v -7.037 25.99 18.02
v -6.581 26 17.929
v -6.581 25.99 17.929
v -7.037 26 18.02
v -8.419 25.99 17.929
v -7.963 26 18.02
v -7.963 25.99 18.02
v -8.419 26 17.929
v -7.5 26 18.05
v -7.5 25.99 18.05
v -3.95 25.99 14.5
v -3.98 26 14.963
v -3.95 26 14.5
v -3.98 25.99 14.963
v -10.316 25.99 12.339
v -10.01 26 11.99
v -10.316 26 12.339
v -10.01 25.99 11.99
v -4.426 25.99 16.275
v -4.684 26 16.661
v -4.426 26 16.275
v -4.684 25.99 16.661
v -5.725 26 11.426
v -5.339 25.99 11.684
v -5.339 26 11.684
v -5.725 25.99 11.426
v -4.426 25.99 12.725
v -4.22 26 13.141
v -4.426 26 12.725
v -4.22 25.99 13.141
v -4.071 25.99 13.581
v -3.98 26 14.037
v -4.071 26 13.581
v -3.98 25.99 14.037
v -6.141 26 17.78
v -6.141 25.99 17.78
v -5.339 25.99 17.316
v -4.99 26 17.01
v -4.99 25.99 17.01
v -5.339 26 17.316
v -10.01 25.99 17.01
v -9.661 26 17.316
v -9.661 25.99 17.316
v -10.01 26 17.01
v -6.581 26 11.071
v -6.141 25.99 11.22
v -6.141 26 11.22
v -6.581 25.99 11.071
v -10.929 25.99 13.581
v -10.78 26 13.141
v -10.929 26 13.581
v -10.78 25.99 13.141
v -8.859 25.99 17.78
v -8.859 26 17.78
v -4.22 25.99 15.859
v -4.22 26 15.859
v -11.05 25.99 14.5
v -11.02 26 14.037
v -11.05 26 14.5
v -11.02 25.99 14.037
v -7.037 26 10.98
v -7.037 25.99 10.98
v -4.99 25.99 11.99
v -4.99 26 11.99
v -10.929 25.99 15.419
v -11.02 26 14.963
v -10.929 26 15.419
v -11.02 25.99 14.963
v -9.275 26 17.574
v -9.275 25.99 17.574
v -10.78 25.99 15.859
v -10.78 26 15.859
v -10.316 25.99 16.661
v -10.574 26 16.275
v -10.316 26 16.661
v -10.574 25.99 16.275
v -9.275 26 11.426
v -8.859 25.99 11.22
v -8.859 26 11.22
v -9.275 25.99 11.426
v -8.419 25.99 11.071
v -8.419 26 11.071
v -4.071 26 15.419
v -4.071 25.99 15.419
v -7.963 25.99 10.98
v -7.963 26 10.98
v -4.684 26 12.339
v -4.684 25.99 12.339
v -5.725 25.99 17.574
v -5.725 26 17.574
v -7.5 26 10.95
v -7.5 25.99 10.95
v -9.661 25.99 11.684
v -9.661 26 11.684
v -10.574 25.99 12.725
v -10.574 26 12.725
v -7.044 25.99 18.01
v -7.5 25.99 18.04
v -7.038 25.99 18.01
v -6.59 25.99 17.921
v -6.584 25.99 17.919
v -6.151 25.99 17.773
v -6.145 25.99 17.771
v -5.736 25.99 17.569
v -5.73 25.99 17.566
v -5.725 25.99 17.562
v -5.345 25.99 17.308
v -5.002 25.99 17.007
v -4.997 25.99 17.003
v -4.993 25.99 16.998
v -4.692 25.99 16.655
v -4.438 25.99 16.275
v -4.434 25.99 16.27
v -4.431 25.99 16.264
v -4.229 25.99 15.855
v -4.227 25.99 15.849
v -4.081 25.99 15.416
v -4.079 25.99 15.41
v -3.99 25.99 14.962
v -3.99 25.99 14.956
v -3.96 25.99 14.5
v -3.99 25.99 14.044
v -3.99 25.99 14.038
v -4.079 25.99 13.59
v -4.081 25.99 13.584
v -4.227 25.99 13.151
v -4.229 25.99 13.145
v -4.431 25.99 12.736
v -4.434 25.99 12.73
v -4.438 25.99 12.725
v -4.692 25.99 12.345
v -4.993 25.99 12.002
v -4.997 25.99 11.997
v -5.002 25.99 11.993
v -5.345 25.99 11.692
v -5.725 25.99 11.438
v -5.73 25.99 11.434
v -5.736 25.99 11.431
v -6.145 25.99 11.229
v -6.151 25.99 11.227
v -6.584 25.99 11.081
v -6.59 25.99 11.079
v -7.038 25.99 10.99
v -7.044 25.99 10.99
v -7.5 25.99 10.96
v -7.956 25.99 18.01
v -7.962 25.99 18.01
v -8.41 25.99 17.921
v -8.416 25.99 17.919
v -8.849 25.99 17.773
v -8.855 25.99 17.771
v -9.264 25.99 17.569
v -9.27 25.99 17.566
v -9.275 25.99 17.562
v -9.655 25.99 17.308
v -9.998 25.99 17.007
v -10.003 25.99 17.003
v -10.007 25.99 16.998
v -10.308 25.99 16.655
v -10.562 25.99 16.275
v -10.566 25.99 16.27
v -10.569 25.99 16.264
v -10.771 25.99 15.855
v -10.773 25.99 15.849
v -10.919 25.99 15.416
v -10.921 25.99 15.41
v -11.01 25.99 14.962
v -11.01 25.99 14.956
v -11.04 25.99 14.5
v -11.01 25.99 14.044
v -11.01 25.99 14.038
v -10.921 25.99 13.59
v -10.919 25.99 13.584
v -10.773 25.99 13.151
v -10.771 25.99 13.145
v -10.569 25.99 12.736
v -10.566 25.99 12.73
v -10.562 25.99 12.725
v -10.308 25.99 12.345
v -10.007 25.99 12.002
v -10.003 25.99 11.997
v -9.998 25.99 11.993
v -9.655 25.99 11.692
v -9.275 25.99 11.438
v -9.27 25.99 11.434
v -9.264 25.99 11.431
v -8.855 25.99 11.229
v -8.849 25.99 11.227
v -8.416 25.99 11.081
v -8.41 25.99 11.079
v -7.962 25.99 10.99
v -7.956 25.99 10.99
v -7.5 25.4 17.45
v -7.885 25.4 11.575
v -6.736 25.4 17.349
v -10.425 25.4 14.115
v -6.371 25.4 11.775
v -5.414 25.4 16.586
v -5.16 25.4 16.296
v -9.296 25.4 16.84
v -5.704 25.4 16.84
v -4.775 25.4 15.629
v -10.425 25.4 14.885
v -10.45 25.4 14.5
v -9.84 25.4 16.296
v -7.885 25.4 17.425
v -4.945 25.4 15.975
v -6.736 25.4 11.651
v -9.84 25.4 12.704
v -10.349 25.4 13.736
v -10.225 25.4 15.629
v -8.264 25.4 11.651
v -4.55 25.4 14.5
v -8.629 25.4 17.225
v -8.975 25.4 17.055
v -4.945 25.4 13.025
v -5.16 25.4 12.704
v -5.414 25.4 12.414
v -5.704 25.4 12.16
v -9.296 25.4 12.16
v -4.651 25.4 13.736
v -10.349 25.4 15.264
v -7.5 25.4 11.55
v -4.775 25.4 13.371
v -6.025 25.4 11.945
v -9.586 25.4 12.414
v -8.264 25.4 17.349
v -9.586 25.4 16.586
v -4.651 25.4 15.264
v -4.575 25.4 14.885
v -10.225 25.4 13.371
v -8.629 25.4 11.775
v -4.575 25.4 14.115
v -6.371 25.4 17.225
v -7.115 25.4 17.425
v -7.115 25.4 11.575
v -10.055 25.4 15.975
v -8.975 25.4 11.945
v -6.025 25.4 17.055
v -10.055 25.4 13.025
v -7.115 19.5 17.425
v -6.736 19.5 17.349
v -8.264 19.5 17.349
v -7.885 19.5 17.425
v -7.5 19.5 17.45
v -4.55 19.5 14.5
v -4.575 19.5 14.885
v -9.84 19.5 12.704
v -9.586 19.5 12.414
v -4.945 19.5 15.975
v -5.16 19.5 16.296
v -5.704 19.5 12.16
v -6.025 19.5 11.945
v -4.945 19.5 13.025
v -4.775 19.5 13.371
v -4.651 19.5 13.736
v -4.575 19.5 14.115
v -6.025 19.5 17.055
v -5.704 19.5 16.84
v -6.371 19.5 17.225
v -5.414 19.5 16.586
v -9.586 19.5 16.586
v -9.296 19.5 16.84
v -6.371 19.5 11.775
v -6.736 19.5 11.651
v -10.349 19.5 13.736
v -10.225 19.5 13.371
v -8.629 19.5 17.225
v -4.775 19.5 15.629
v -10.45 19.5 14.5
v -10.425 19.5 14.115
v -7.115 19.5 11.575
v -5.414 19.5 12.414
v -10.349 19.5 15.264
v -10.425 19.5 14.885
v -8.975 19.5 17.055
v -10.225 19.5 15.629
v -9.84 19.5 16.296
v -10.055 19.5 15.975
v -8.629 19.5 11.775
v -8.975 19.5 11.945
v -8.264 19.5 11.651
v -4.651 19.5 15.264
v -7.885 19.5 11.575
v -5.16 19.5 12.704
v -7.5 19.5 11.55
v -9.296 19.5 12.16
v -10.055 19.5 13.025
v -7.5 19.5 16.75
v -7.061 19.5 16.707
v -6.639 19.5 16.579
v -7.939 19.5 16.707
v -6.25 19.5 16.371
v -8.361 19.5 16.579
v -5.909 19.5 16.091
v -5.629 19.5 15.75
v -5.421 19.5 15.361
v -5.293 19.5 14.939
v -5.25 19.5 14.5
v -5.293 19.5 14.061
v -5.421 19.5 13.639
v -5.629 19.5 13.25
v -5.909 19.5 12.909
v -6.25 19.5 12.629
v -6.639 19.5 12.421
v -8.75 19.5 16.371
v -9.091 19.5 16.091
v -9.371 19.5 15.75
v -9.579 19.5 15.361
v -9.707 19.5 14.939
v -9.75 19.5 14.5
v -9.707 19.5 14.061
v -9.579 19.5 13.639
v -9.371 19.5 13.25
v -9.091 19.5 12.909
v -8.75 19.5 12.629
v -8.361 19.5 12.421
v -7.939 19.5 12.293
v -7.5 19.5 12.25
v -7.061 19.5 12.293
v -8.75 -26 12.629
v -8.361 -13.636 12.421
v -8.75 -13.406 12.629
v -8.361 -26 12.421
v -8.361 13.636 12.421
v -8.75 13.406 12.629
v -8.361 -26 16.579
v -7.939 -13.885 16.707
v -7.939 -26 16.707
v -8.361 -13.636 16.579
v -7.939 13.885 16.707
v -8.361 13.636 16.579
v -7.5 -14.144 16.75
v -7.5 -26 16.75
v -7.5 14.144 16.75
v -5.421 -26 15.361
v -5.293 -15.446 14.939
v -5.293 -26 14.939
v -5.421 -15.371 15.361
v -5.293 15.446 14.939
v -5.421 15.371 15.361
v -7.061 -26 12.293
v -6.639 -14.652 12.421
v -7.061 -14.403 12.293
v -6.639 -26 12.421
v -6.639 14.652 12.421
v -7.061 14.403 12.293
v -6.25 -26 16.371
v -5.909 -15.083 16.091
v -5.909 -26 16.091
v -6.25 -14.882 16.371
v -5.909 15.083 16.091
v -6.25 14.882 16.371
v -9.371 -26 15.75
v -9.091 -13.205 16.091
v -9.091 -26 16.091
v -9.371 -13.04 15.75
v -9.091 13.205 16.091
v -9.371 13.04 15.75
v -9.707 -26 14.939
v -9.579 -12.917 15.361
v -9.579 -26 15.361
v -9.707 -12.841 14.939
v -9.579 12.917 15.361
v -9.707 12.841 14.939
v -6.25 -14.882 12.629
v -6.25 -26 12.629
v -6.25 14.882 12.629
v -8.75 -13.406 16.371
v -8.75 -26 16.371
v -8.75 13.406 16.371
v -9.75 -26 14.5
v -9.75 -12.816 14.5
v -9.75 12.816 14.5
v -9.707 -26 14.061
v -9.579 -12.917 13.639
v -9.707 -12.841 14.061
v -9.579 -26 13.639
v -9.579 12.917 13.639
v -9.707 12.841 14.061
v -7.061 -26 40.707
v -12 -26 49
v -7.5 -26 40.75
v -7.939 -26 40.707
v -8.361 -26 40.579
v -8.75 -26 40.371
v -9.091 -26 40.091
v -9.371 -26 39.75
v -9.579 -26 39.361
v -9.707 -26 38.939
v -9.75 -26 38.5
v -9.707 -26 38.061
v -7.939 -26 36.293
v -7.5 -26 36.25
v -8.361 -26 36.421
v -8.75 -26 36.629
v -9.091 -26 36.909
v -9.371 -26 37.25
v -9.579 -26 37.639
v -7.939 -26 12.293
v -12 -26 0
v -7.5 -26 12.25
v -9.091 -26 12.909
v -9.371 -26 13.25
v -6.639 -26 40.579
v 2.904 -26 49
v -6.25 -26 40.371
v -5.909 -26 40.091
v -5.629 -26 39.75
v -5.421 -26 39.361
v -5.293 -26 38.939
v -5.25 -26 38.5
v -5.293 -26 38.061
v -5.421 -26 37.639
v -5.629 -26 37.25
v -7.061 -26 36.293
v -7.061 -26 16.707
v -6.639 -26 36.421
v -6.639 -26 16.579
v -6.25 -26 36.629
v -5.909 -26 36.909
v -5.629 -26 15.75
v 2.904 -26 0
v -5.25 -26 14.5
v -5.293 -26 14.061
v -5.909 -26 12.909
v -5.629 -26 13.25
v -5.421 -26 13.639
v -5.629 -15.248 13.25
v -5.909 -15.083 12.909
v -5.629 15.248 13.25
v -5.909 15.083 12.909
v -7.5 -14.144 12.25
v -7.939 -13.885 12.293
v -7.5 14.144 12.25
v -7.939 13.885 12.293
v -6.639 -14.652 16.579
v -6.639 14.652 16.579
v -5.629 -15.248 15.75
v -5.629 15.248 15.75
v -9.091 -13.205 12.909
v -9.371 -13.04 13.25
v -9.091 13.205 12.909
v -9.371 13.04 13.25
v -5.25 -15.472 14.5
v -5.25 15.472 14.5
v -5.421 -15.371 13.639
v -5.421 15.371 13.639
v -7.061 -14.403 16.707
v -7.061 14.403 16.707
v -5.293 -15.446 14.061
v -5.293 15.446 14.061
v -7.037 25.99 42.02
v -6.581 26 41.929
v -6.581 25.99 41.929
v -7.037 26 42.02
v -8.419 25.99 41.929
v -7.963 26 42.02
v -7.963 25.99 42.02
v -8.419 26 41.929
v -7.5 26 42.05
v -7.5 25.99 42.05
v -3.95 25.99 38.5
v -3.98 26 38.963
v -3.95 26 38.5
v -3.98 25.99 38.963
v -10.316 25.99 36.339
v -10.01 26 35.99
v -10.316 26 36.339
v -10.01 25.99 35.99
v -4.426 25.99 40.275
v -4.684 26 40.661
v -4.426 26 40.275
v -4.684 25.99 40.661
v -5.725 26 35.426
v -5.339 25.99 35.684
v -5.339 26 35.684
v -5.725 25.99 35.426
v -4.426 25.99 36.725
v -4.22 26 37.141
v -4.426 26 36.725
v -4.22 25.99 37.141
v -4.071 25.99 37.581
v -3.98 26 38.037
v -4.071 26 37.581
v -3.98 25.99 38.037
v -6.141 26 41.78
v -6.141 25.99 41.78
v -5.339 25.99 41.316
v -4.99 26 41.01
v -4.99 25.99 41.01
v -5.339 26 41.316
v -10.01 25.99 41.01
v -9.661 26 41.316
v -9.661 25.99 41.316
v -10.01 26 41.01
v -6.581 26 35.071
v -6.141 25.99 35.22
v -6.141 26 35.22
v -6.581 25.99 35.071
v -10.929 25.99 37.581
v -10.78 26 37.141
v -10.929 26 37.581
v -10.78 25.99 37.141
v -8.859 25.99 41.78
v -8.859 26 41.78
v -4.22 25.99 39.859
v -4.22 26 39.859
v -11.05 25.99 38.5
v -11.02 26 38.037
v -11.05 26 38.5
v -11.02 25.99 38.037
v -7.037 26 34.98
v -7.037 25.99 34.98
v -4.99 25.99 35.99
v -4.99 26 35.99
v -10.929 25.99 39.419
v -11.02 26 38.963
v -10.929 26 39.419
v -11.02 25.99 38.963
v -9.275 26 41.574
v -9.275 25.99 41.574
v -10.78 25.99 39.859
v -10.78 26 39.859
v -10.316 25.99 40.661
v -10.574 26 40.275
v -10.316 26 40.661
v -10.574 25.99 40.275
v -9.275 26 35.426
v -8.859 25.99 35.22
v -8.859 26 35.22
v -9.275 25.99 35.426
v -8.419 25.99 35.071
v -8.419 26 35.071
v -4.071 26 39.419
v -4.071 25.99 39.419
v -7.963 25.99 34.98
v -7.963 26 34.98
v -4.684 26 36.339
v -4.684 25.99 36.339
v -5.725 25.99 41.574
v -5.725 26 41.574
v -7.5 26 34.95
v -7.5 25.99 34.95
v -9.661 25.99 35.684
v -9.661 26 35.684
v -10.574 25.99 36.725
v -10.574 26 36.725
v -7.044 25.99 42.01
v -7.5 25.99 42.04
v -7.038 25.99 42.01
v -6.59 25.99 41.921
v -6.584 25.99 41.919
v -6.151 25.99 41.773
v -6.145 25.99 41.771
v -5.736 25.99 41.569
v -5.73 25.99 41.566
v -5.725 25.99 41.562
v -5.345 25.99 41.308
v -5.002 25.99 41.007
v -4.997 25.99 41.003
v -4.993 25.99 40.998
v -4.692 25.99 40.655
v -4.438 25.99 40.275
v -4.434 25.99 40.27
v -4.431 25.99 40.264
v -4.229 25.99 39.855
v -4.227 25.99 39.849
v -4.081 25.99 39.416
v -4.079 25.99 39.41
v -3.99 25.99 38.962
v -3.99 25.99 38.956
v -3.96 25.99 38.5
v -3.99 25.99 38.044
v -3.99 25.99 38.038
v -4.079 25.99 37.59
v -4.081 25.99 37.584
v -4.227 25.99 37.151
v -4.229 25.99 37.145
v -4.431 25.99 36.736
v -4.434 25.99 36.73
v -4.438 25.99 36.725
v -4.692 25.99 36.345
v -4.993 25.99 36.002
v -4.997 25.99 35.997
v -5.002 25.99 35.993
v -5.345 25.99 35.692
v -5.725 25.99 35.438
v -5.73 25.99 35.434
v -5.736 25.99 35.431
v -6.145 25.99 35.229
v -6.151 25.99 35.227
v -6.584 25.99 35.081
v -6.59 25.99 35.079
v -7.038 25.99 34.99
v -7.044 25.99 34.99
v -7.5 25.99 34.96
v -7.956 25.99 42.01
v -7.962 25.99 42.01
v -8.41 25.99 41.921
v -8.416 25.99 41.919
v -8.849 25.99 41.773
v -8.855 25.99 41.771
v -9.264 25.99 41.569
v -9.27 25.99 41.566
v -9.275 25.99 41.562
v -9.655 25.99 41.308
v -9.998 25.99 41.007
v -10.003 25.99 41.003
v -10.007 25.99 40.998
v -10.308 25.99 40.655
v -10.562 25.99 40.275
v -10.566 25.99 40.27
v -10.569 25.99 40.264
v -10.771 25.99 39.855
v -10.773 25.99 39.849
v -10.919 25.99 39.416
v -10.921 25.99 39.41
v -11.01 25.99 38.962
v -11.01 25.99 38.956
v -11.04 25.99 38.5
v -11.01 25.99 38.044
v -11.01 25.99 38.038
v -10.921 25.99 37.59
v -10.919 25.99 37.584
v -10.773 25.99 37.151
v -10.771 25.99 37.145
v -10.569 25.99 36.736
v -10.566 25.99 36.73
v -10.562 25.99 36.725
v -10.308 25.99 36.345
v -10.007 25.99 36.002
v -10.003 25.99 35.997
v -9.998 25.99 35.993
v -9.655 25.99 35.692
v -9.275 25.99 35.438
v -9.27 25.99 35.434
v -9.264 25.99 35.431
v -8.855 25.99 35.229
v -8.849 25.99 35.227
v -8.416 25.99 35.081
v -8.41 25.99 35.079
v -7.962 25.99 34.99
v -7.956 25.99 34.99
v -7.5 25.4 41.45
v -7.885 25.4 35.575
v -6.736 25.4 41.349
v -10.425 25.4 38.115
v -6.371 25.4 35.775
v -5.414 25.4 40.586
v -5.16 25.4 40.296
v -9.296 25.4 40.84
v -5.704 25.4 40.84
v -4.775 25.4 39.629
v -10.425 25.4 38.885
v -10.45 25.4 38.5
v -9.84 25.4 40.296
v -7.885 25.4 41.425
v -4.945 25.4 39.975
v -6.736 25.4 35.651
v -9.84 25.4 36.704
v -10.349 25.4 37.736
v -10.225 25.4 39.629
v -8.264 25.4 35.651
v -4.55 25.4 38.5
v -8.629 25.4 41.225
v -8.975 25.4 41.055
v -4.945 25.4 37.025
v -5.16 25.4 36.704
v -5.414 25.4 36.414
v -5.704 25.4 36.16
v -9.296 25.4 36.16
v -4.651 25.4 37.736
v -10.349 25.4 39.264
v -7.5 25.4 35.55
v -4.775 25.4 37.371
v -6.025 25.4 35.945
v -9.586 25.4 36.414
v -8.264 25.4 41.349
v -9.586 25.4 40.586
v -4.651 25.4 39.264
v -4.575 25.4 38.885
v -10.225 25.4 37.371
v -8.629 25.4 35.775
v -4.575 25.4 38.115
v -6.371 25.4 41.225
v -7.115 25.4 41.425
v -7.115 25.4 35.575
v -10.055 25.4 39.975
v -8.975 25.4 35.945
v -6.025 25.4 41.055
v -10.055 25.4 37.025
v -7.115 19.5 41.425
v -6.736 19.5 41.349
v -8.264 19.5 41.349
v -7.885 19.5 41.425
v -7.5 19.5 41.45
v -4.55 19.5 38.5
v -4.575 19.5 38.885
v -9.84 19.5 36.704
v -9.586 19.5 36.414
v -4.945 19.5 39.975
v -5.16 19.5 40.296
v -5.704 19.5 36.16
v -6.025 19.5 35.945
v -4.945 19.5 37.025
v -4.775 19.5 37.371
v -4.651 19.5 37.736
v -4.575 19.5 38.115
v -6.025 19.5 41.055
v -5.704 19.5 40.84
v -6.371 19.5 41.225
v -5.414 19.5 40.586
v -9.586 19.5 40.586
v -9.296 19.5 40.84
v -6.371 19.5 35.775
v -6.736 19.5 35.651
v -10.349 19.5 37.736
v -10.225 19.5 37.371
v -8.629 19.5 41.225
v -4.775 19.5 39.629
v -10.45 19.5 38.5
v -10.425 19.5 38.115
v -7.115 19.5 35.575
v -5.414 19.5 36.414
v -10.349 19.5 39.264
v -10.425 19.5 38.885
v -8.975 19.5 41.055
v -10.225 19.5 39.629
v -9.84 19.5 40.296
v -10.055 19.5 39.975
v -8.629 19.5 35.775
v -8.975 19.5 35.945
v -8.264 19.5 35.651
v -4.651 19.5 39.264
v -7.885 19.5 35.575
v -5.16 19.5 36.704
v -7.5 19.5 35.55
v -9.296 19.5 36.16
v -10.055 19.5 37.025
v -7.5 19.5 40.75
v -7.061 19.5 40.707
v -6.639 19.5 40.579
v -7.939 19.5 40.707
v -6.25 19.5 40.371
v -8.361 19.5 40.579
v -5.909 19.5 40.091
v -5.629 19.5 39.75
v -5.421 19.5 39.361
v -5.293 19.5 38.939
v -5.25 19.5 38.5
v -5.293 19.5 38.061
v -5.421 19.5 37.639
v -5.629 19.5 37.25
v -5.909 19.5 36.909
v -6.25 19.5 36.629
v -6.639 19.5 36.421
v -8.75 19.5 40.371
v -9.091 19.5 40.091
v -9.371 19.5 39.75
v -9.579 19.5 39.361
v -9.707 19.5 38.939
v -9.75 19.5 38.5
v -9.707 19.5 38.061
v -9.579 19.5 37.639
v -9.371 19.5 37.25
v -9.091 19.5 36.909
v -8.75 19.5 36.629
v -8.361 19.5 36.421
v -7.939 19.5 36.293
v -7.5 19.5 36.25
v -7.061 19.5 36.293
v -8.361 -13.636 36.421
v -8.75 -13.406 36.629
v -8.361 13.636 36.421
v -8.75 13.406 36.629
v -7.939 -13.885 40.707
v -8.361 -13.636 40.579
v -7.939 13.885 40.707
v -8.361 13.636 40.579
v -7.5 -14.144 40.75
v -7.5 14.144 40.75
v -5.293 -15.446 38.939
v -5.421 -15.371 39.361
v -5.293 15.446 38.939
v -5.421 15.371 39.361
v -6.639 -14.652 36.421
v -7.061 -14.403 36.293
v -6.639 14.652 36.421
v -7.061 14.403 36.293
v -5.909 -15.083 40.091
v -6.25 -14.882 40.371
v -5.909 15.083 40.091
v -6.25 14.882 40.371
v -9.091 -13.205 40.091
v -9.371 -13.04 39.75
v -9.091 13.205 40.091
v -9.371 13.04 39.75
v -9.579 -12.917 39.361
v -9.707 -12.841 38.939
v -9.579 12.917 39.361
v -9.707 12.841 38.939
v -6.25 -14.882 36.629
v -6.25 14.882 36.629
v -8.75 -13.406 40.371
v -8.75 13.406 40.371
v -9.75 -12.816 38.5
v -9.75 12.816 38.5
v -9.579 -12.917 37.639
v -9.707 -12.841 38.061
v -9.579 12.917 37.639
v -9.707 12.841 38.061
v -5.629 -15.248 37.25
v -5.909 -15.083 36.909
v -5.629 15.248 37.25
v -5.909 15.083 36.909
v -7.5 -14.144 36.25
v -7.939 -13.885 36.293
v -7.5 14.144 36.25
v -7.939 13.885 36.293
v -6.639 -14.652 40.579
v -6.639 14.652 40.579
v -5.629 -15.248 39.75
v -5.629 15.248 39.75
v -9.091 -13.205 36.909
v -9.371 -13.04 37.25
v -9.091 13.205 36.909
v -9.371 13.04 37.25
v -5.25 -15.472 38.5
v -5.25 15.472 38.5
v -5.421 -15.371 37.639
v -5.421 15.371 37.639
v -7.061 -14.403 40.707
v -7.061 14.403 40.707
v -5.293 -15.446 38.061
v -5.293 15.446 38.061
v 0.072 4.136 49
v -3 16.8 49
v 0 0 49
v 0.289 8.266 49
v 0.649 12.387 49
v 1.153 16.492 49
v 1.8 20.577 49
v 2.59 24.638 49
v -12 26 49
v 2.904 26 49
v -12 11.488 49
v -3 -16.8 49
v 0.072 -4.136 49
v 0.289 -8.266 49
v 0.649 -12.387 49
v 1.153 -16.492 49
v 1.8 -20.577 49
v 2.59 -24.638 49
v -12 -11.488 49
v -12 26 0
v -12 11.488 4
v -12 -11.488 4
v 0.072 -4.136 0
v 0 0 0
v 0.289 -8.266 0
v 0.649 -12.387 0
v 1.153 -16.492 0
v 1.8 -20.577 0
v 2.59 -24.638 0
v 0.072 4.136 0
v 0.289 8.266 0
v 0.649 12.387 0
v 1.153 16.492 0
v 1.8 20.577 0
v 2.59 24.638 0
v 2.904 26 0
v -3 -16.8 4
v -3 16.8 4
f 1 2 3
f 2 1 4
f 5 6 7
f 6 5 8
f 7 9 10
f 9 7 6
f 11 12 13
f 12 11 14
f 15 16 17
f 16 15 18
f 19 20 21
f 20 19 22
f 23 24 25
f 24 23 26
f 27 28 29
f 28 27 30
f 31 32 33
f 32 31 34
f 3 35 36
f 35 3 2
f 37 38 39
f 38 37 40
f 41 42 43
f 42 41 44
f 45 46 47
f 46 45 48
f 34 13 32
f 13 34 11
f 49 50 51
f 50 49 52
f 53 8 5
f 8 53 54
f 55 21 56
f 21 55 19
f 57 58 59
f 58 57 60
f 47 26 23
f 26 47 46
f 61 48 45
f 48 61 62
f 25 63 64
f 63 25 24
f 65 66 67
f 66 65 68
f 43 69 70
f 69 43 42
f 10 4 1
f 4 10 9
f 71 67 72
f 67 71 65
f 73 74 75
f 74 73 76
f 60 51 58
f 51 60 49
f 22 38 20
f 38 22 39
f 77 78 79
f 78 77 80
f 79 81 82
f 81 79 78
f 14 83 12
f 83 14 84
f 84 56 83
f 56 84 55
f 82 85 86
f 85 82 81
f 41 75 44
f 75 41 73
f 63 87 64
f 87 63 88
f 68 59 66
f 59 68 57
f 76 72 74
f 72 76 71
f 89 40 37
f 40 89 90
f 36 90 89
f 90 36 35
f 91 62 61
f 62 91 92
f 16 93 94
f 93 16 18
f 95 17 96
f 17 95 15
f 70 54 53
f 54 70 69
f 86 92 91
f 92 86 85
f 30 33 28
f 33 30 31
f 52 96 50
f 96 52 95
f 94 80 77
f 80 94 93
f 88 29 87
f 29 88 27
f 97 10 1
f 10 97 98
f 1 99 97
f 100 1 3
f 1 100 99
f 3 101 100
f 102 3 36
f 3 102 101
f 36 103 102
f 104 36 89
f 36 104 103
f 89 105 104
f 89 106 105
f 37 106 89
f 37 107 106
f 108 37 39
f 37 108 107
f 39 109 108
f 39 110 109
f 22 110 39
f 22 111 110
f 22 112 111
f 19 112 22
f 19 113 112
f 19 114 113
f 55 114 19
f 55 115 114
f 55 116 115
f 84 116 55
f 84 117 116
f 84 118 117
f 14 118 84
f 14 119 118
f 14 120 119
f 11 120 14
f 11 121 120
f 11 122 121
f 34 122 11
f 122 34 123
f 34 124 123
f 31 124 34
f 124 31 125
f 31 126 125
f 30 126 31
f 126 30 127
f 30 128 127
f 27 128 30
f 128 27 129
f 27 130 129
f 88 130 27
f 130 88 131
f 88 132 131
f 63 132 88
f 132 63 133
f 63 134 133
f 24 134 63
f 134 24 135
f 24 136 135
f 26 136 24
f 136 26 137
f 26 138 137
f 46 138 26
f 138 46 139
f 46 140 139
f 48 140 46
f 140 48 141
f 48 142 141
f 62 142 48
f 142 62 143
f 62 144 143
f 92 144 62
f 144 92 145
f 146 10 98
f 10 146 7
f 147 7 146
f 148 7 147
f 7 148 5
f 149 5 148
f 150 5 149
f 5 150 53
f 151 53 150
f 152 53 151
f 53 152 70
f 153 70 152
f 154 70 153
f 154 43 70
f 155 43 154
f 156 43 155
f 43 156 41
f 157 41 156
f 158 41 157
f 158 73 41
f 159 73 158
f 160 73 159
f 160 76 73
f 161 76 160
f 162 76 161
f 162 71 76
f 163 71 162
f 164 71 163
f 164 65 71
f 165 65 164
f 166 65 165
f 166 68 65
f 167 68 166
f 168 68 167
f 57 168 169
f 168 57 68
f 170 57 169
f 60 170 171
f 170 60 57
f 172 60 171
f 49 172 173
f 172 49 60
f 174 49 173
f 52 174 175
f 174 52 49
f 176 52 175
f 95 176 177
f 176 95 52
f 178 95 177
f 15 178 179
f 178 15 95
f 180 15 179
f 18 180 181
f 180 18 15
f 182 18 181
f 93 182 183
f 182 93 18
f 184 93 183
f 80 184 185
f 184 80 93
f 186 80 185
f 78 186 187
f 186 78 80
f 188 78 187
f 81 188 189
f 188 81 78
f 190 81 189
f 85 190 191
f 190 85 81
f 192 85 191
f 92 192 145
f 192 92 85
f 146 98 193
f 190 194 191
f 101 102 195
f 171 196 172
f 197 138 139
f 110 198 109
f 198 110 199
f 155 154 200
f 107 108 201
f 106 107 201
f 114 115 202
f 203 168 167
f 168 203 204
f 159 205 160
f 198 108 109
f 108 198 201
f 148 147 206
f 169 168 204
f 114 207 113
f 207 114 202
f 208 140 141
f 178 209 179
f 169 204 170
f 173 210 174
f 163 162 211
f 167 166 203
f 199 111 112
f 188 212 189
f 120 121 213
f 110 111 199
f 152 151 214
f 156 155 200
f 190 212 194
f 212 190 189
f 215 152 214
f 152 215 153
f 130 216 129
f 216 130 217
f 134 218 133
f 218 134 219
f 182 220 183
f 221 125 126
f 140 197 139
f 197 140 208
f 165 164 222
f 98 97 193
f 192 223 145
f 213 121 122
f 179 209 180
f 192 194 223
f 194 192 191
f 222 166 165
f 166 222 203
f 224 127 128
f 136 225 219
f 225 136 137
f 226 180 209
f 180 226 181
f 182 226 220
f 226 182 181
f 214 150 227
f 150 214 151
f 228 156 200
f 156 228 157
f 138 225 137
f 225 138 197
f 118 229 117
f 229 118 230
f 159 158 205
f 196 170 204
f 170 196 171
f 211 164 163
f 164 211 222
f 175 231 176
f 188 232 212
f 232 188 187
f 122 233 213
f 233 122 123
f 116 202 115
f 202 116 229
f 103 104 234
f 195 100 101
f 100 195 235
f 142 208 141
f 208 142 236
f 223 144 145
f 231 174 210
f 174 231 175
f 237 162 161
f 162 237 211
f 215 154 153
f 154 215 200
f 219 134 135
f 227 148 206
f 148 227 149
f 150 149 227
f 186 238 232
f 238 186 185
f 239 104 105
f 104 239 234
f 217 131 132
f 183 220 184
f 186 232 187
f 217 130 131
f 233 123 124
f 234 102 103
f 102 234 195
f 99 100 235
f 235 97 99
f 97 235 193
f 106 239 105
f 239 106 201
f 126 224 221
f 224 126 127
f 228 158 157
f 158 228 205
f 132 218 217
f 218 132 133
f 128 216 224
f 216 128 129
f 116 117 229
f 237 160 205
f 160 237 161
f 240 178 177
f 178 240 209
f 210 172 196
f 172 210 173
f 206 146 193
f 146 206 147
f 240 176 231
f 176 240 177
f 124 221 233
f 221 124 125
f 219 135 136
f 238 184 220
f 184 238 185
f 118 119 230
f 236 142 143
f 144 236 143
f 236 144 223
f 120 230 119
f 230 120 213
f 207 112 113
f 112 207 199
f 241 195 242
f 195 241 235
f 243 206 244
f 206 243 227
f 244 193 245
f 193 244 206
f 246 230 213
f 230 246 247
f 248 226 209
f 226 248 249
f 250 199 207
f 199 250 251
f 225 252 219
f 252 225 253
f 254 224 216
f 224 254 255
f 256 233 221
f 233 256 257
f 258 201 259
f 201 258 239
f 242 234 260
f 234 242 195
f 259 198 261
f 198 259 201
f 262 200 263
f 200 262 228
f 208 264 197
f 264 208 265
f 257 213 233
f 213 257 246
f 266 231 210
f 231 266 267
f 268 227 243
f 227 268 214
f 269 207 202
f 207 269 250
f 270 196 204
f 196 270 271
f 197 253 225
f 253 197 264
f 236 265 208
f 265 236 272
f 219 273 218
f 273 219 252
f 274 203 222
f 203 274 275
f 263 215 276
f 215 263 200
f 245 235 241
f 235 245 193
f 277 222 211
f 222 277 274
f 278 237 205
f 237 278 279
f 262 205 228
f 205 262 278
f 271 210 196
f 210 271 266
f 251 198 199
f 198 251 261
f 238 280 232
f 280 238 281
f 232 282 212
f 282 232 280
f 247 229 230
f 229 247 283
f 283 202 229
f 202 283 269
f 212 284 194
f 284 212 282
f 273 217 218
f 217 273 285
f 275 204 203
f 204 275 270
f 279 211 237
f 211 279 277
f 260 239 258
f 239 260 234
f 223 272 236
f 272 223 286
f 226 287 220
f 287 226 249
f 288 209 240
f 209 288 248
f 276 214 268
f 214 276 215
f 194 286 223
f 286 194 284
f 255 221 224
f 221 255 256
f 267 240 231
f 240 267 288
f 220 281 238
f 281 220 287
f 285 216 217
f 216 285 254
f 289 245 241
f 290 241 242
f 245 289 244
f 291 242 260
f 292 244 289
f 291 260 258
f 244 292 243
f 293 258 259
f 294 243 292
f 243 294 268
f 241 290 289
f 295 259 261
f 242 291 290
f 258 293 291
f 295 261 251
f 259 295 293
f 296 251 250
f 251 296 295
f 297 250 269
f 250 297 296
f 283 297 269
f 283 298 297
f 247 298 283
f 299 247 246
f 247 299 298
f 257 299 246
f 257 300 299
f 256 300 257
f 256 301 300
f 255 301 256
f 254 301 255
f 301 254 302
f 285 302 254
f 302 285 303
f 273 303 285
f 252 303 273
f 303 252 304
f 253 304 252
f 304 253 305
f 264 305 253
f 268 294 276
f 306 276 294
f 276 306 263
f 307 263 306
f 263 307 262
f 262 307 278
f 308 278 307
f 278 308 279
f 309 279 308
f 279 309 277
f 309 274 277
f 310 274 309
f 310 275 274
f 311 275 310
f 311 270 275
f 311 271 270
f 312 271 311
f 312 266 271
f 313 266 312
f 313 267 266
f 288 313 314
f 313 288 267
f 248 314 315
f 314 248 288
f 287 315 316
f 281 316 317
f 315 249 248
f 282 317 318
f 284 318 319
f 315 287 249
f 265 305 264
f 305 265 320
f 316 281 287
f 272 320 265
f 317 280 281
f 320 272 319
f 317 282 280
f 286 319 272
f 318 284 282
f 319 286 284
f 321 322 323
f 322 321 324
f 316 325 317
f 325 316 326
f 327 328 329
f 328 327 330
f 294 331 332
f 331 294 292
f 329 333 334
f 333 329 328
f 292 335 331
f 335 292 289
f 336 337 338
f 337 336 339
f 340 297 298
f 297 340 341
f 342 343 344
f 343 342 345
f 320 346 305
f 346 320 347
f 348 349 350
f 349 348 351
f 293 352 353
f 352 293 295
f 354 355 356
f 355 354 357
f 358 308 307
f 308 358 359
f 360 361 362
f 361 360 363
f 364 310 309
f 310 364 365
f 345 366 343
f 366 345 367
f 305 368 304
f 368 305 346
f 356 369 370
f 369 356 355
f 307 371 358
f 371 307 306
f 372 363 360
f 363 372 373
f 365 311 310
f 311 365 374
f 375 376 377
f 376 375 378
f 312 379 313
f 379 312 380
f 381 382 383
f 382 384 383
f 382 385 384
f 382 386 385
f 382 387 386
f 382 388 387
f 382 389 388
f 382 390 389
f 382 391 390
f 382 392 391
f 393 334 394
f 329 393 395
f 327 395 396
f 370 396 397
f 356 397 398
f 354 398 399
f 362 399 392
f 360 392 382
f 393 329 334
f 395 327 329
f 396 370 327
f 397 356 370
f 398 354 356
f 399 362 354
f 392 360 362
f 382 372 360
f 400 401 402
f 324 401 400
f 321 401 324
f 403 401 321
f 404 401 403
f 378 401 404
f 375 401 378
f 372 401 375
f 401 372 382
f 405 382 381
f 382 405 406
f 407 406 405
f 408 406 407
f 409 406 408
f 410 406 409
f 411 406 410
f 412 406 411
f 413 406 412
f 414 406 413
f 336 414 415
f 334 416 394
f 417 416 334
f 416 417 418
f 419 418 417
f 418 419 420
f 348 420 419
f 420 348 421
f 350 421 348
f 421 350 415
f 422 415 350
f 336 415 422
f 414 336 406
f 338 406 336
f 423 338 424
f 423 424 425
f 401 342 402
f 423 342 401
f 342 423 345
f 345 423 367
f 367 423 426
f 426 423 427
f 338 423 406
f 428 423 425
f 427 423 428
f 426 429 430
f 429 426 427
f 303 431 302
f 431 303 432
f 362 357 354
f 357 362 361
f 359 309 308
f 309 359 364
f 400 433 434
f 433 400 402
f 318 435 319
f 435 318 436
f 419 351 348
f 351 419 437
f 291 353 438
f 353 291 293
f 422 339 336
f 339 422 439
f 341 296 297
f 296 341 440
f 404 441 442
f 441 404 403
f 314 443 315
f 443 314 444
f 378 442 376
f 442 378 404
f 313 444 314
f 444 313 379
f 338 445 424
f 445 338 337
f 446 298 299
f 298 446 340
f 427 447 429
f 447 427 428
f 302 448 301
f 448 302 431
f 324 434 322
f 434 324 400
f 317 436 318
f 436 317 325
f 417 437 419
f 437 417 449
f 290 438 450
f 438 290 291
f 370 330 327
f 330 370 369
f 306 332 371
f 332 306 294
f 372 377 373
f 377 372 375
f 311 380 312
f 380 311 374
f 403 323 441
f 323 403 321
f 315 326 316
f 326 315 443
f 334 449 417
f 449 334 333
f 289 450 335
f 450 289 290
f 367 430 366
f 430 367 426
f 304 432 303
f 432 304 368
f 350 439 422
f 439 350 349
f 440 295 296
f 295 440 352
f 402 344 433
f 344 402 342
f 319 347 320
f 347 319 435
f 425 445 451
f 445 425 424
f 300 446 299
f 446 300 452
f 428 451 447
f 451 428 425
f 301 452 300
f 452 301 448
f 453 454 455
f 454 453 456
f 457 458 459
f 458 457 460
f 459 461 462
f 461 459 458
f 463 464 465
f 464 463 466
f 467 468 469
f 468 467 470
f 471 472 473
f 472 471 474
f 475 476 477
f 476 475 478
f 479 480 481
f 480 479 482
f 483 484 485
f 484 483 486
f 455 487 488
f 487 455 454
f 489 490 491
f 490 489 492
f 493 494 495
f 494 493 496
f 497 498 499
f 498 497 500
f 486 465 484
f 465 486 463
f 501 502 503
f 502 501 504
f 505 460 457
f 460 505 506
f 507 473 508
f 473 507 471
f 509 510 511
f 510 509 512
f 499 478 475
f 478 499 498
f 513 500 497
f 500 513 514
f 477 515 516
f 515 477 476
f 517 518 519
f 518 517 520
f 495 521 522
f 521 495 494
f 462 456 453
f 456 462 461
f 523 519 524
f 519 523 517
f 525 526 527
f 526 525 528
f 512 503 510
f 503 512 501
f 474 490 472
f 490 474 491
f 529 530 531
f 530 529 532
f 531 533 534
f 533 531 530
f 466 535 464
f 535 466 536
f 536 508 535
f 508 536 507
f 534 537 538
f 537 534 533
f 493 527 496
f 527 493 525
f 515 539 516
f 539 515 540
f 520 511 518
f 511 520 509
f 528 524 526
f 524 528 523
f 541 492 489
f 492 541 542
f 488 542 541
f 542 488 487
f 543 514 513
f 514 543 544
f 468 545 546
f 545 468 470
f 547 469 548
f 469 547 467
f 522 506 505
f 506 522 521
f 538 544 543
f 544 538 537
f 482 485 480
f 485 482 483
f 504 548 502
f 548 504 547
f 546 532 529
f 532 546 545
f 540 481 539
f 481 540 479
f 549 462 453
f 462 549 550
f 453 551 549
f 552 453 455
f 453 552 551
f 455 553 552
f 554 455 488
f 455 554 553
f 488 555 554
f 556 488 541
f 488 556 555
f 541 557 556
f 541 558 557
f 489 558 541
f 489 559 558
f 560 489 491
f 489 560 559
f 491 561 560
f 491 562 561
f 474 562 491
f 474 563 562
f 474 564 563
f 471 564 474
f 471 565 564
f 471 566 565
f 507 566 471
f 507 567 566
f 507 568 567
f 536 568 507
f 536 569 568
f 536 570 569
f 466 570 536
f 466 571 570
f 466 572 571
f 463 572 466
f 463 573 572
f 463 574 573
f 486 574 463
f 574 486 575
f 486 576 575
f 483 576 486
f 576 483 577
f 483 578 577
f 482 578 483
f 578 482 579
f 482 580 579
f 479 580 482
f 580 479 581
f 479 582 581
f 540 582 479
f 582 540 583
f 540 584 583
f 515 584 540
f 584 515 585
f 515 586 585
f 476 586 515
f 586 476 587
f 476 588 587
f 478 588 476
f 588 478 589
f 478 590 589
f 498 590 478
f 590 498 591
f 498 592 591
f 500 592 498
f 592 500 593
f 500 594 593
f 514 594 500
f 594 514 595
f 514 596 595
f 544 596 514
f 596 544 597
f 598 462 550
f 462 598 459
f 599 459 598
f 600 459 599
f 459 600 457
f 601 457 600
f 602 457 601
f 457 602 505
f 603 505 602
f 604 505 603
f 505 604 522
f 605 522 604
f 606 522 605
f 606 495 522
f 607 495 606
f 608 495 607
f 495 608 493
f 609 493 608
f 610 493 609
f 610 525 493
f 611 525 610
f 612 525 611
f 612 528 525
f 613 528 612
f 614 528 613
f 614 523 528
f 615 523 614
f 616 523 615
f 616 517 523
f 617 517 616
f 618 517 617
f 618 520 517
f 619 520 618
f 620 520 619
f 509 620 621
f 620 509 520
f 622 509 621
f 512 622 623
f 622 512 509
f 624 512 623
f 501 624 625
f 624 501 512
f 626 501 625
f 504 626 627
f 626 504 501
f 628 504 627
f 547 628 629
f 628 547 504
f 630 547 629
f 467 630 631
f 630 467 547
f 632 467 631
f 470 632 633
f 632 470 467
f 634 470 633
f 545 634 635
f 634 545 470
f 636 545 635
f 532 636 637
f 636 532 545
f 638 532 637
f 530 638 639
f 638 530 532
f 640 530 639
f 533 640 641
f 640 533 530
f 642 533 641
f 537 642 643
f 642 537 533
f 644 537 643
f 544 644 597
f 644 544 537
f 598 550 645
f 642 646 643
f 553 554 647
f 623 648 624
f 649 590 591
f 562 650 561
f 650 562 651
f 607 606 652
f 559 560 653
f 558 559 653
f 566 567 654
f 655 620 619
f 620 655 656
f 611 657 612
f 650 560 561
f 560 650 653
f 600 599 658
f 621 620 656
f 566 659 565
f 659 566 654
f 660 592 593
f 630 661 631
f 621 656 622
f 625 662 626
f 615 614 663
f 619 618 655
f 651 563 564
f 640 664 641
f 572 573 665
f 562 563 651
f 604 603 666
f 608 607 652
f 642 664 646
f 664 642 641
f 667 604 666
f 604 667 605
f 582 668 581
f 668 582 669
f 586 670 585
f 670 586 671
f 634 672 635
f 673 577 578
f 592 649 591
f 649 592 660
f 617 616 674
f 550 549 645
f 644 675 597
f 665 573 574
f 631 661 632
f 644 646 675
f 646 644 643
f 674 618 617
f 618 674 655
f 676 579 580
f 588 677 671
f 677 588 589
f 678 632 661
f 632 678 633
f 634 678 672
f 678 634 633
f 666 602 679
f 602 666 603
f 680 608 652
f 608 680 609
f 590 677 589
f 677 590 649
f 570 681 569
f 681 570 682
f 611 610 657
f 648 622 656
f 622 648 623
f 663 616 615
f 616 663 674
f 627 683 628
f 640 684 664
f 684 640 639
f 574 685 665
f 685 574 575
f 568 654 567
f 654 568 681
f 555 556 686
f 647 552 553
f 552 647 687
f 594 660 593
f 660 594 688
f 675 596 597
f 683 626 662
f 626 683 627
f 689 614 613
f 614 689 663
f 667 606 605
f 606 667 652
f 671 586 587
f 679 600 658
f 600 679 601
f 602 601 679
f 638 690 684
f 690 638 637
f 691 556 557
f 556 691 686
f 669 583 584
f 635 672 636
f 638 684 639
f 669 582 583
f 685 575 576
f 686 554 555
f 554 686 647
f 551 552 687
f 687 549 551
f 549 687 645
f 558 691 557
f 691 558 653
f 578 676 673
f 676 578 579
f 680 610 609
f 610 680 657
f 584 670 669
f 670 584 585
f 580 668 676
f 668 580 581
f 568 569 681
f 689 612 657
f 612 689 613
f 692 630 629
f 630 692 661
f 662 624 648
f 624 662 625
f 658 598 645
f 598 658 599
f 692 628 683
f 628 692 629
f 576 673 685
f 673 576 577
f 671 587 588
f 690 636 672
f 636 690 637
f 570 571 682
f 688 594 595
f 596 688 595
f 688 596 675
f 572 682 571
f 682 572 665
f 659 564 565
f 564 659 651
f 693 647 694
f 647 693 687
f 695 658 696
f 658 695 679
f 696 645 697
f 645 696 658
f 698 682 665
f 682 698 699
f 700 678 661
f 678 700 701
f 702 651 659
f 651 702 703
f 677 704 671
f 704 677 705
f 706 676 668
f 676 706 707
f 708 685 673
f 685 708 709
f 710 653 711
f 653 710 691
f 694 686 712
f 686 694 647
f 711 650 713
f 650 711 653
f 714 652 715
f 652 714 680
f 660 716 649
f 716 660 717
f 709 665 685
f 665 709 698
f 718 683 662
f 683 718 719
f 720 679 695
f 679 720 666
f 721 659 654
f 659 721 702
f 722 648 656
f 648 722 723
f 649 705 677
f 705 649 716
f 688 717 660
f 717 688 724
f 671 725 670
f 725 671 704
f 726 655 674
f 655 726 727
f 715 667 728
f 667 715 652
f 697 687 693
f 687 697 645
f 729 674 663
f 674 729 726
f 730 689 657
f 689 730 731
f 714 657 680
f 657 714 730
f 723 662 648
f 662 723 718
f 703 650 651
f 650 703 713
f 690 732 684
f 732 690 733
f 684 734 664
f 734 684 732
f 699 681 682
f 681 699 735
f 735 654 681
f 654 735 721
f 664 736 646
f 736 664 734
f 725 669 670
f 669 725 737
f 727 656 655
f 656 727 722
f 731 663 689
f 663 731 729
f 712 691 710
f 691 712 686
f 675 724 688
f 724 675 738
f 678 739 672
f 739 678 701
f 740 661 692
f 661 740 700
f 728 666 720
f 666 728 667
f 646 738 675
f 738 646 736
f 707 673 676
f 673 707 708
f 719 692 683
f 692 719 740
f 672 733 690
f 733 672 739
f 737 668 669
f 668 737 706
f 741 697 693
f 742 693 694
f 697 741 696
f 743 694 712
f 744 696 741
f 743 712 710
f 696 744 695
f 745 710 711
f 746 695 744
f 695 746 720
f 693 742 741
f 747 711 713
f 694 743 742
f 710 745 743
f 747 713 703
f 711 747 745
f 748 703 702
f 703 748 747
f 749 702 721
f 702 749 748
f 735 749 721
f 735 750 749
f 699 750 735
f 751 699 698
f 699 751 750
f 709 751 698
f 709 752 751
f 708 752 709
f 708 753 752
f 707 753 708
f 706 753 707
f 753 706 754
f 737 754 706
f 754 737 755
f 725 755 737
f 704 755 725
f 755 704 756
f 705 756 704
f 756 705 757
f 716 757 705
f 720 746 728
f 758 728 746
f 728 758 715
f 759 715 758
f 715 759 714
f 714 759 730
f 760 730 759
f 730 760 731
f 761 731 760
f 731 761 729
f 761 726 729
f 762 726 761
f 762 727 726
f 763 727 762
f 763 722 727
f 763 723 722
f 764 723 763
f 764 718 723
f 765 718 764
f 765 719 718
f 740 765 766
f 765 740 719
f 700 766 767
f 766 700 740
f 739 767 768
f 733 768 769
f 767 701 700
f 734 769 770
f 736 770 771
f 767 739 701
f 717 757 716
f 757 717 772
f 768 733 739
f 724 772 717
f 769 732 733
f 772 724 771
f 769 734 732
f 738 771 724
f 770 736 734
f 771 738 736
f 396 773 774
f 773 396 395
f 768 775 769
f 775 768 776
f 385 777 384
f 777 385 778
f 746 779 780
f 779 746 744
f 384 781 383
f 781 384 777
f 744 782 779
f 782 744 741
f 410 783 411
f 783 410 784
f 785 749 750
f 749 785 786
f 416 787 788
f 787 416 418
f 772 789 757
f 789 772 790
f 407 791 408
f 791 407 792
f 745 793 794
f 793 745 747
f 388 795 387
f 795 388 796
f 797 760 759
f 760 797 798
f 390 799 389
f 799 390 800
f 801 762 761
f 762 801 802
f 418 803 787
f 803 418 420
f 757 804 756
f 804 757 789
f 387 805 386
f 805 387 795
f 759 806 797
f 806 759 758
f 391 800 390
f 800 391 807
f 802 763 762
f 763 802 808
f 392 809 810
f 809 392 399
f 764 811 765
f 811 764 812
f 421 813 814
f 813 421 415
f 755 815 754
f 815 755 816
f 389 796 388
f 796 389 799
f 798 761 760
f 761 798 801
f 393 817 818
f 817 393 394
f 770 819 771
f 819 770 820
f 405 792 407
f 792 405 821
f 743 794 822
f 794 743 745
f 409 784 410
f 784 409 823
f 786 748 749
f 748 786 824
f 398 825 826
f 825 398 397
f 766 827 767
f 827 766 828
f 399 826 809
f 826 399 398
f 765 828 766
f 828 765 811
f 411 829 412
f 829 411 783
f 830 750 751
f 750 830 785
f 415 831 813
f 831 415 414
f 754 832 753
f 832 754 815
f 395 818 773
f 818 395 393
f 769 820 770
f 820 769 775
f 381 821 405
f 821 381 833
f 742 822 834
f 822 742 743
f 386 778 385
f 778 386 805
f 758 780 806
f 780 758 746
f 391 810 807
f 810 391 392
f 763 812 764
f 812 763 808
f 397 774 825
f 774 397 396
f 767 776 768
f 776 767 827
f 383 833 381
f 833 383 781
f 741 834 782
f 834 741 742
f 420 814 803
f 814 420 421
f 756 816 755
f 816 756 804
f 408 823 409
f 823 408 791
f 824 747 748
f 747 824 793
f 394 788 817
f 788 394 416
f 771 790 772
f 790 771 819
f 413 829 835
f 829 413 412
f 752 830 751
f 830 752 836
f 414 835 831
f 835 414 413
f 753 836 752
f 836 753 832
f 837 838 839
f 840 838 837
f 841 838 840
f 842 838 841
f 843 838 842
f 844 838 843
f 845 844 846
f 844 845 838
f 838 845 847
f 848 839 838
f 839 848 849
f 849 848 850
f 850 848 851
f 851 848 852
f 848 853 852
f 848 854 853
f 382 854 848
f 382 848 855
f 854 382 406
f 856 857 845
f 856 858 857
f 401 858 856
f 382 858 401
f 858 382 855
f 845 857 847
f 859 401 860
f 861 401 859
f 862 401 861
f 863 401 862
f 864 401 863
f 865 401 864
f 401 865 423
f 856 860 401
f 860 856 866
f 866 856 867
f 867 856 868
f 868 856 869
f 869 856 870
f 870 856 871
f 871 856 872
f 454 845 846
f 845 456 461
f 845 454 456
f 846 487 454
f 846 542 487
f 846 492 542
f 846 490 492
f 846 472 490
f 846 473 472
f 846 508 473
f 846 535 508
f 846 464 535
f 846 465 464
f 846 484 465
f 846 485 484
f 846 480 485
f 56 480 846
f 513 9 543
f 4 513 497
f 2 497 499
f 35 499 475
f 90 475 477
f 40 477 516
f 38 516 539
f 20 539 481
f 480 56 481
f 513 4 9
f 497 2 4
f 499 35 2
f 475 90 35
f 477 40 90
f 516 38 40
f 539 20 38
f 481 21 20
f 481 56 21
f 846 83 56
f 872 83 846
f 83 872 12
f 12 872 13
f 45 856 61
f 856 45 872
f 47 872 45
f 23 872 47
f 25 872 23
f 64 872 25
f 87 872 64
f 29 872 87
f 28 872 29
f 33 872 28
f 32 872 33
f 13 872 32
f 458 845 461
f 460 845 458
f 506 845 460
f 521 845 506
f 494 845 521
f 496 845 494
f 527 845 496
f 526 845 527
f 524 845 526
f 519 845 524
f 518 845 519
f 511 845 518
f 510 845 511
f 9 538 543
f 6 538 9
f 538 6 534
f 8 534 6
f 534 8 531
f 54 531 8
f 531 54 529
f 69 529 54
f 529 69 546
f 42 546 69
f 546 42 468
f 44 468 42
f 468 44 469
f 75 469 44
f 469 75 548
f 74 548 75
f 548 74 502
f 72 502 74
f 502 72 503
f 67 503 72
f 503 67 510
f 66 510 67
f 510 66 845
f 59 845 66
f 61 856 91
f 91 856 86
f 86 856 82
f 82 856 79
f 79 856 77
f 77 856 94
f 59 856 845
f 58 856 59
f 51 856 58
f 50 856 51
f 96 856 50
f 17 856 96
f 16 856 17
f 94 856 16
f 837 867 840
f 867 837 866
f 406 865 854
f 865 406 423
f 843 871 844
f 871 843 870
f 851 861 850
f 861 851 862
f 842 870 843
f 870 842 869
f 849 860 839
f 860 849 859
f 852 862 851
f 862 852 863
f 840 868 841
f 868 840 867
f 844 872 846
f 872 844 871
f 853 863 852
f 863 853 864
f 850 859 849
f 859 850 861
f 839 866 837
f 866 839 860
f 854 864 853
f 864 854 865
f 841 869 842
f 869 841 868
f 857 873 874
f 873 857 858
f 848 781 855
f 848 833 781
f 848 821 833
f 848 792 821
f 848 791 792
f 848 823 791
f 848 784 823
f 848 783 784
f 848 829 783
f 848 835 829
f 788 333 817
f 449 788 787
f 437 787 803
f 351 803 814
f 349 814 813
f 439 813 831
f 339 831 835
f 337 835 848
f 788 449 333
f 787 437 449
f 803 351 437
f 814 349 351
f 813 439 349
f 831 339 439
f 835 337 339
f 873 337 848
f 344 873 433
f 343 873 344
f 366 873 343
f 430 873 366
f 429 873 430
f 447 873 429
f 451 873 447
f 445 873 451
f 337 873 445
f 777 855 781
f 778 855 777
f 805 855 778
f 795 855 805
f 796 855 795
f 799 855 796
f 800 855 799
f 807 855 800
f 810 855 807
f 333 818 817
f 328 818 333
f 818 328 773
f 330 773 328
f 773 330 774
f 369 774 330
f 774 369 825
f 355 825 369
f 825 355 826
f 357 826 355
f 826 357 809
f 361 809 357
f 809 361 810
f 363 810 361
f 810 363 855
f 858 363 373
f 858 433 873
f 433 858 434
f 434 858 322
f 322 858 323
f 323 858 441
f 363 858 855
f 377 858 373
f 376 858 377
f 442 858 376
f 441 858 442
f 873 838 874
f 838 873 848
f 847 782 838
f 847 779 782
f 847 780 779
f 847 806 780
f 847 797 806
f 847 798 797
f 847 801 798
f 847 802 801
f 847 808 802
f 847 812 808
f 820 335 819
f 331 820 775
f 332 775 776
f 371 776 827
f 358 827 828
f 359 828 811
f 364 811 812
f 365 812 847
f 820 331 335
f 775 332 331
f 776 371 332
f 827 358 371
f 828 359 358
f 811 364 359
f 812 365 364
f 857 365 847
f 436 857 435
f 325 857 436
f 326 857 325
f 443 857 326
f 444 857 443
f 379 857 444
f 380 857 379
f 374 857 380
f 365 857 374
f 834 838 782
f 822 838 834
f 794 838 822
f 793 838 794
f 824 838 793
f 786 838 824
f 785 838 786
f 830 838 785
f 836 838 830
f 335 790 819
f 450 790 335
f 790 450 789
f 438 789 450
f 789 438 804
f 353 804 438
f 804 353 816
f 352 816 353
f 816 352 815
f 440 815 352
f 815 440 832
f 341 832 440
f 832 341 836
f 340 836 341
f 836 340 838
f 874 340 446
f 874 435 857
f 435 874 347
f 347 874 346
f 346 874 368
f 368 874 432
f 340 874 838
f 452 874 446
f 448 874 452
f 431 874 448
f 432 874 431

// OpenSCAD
// Copyright (C) 2026 Arun Venkataswamy
// Copyright (C) 2026 Kyle Downs
//
// This file is part of Starlock.
//
// Starlock is free software: you can redistribute it and/or modify it
// under the terms of the GNU General Public License as published by
// the Free Software Foundation, either version 3 of the License, or
// (at your option) any later version.
//
// Starlock is distributed in the hope that it will be useful, but
// WITHOUT ANY WARRANTY; without even the implied warranty of
// MERCHANTABILITY or FITNESS FOR A PARTICULAR PURPOSE. See the GNU
// General Public License for more details.
//
// You should have received a copy of the GNU General Public License
// along with Starlock. If not, see <https://www.gnu.org/licenses/>.

// ============================================================
// Starlock Tube Shoe — a second finder shoe for the telescope tube
// ============================================================
//
// For scopes whose only finder shoe is taken by the finder. A female
// dovetail shoe, made to take the dovetail rail of the camera mounts
// (housing_v3 low mount, housing_v4 Pi mount), with its base curved to
// the tube. It sticks on with 3M VHB foam tape — no drilling. The foam
// takes up a millimetre or two of curvature mismatch, so the tube's
// diameter only needs to be roughly right.
//
// The rail slides in from the open end until it hits the stop, so the
// camera goes back to the same place each night. Two M4 thumbscrews in
// the side wall press it against the far flank.
//
// Default tube: Apertura AD8. MEASURE YOUR TUBE: wrap a strip of paper
// round it, mark the overlap, and set tube_od = circumference / π.
//
// HARDWARE:
//   2 × M4 × 6 heat-set inserts (5.9 mm knurl — the same as the
//   camera housing's), 2 × M4 × 16 thumbscrews (nylon-tipped if you can
//   get them), and a strip of 3M VHB tape (e.g. 5952, 1.1 mm) about
//   50 × 45 mm. Clean the tube with isopropyl alcohol first, press hard
//   for 30 s, and leave it a day before loading it.
//
// Where to stick it: along the tube (the open end toward the
// eyepiece end, so the camera points where the tube points), somewhere
// the camera's view isn't blocked by the focuser or finder and it
// doesn't foul the rocker box when the tube is pointed at the zenith.
//
// PRINTING: stands on its stop end (add a 5 mm brim), so every face is a vertical wall —
// no supports. PETG preferred (PLA can creep in a hot car).

$fn = 180;

// ============================================================
// DIMENSIONS — all values in millimeters
// ============================================================

/* Telescope tube */
tube_od               = 237;     // Apertura AD8: measured 744 mm round / π

/* Camera mount rail (housing_v3.scad: dovetail_*) */
rail_bottom_width     = 33;      // wide face, sits on the shoe floor
rail_top_width        = 20;      // narrow face, at rail_height
rail_height           = 11;
rail_length           = 39;

/* Shoe */
fit_clearance         = 0.3;     // per side, horizontally
channel_depth         = 9;       // shoe walls stop below the rail's narrow face
floor_thickness       = 3;       // at the centre line (more toward the edges)
shoe_width            = 52;
channel_length        = 45;      // rail_length + room to slide
stop_thickness        = 4;       // closed end the rail stops against

/* Thumbscrews — M4 heat-set inserts in the +Y wall */
insert_hole_dia       = 5.9;
insert_lead_in        = 0.6;
insert_hole_depth     = 6.5;
screw_clear_dia       = 4.5;
screw_x               = [-12, 12];   // from the channel's centre

// ============================================================
// DERIVED
// ============================================================

tube_r      = tube_od / 2;
shoe_length = channel_length + stop_thickness;
top_z       = floor_thickness + channel_depth;
edge_sag    = tube_r - sqrt(tube_r * tube_r - (shoe_width / 2) * (shoe_width / 2));
screw_z     = floor_thickness + channel_depth / 2;

function rail_half(d) = rail_bottom_width / 2
                      - (rail_bottom_width - rail_top_width) / 2 * d / rail_height;
channel_half_bottom = rail_half(0) + fit_clearance;
channel_half_top    = rail_half(channel_depth) + fit_clearance;
wall_at_screw       = shoe_width / 2 - (rail_half(channel_depth / 2) + fit_clearance);

assert(channel_depth < rail_height - 1, "walls would reach the mount's bridge");
assert(wall_at_screw > insert_hole_depth + 2, "side wall too thin for the inserts");
assert(screw_z + insert_hole_dia / 2 + 1 <= top_z, "insert too close to the top");
assert(channel_length >= rail_length + 2, "channel shorter than the rail");

// ============================================================
// MODEL — X along the tube, Y across it, Z away from the tube.
// The tube's top line is at Z = 0; the stop is at X = 0.
// ============================================================

module tube_shoe() {
    difference() {
        // Body: a block, less the tube
        translate([0, -shoe_width / 2, -edge_sag - 1])
            cube([shoe_length, shoe_width, top_z + edge_sag + 1]);

        translate([-1, 0, -tube_r])
            rotate([0, 90, 0])
                cylinder(r = tube_r, h = shoe_length + 2);

        // Dovetail channel, open at X = shoe_length
        translate([stop_thickness, 0, 0])
            rotate([90, 0, 90])
                linear_extrude(channel_length + 1)
                    polygon([
                        [-channel_half_bottom, floor_thickness],
                        [ channel_half_bottom, floor_thickness],
                        [ channel_half_top,    top_z + 0.01],
                        [ channel_half_top,    top_z + 1],
                        [-channel_half_top,    top_z + 1],
                        [-channel_half_top,    top_z + 0.01],
                    ]);

        // Thumbscrew inserts, from the +Y face
        for (sx = screw_x)
            translate([stop_thickness + channel_length / 2 + sx,
                       shoe_width / 2, screw_z])
                rotate([90, 0, 0]) {
                    translate([0, 0, -1])
                        cylinder(d = insert_hole_dia + 2 * insert_lead_in, h = 1.01, $fn = 48);
                    cylinder(d1 = insert_hole_dia + 2 * insert_lead_in,
                             d2 = insert_hole_dia, h = insert_lead_in, $fn = 48);
                    cylinder(d = insert_hole_dia, h = insert_hole_depth, $fn = 48);
                    cylinder(d = screw_clear_dia, h = shoe_width, $fn = 32);
                }
    }
}

// Print orientation: standing on the stop end
rotate([0, -90, 0]) tube_shoe();     // X (along the tube) becomes Z; stop end at Z = 0
